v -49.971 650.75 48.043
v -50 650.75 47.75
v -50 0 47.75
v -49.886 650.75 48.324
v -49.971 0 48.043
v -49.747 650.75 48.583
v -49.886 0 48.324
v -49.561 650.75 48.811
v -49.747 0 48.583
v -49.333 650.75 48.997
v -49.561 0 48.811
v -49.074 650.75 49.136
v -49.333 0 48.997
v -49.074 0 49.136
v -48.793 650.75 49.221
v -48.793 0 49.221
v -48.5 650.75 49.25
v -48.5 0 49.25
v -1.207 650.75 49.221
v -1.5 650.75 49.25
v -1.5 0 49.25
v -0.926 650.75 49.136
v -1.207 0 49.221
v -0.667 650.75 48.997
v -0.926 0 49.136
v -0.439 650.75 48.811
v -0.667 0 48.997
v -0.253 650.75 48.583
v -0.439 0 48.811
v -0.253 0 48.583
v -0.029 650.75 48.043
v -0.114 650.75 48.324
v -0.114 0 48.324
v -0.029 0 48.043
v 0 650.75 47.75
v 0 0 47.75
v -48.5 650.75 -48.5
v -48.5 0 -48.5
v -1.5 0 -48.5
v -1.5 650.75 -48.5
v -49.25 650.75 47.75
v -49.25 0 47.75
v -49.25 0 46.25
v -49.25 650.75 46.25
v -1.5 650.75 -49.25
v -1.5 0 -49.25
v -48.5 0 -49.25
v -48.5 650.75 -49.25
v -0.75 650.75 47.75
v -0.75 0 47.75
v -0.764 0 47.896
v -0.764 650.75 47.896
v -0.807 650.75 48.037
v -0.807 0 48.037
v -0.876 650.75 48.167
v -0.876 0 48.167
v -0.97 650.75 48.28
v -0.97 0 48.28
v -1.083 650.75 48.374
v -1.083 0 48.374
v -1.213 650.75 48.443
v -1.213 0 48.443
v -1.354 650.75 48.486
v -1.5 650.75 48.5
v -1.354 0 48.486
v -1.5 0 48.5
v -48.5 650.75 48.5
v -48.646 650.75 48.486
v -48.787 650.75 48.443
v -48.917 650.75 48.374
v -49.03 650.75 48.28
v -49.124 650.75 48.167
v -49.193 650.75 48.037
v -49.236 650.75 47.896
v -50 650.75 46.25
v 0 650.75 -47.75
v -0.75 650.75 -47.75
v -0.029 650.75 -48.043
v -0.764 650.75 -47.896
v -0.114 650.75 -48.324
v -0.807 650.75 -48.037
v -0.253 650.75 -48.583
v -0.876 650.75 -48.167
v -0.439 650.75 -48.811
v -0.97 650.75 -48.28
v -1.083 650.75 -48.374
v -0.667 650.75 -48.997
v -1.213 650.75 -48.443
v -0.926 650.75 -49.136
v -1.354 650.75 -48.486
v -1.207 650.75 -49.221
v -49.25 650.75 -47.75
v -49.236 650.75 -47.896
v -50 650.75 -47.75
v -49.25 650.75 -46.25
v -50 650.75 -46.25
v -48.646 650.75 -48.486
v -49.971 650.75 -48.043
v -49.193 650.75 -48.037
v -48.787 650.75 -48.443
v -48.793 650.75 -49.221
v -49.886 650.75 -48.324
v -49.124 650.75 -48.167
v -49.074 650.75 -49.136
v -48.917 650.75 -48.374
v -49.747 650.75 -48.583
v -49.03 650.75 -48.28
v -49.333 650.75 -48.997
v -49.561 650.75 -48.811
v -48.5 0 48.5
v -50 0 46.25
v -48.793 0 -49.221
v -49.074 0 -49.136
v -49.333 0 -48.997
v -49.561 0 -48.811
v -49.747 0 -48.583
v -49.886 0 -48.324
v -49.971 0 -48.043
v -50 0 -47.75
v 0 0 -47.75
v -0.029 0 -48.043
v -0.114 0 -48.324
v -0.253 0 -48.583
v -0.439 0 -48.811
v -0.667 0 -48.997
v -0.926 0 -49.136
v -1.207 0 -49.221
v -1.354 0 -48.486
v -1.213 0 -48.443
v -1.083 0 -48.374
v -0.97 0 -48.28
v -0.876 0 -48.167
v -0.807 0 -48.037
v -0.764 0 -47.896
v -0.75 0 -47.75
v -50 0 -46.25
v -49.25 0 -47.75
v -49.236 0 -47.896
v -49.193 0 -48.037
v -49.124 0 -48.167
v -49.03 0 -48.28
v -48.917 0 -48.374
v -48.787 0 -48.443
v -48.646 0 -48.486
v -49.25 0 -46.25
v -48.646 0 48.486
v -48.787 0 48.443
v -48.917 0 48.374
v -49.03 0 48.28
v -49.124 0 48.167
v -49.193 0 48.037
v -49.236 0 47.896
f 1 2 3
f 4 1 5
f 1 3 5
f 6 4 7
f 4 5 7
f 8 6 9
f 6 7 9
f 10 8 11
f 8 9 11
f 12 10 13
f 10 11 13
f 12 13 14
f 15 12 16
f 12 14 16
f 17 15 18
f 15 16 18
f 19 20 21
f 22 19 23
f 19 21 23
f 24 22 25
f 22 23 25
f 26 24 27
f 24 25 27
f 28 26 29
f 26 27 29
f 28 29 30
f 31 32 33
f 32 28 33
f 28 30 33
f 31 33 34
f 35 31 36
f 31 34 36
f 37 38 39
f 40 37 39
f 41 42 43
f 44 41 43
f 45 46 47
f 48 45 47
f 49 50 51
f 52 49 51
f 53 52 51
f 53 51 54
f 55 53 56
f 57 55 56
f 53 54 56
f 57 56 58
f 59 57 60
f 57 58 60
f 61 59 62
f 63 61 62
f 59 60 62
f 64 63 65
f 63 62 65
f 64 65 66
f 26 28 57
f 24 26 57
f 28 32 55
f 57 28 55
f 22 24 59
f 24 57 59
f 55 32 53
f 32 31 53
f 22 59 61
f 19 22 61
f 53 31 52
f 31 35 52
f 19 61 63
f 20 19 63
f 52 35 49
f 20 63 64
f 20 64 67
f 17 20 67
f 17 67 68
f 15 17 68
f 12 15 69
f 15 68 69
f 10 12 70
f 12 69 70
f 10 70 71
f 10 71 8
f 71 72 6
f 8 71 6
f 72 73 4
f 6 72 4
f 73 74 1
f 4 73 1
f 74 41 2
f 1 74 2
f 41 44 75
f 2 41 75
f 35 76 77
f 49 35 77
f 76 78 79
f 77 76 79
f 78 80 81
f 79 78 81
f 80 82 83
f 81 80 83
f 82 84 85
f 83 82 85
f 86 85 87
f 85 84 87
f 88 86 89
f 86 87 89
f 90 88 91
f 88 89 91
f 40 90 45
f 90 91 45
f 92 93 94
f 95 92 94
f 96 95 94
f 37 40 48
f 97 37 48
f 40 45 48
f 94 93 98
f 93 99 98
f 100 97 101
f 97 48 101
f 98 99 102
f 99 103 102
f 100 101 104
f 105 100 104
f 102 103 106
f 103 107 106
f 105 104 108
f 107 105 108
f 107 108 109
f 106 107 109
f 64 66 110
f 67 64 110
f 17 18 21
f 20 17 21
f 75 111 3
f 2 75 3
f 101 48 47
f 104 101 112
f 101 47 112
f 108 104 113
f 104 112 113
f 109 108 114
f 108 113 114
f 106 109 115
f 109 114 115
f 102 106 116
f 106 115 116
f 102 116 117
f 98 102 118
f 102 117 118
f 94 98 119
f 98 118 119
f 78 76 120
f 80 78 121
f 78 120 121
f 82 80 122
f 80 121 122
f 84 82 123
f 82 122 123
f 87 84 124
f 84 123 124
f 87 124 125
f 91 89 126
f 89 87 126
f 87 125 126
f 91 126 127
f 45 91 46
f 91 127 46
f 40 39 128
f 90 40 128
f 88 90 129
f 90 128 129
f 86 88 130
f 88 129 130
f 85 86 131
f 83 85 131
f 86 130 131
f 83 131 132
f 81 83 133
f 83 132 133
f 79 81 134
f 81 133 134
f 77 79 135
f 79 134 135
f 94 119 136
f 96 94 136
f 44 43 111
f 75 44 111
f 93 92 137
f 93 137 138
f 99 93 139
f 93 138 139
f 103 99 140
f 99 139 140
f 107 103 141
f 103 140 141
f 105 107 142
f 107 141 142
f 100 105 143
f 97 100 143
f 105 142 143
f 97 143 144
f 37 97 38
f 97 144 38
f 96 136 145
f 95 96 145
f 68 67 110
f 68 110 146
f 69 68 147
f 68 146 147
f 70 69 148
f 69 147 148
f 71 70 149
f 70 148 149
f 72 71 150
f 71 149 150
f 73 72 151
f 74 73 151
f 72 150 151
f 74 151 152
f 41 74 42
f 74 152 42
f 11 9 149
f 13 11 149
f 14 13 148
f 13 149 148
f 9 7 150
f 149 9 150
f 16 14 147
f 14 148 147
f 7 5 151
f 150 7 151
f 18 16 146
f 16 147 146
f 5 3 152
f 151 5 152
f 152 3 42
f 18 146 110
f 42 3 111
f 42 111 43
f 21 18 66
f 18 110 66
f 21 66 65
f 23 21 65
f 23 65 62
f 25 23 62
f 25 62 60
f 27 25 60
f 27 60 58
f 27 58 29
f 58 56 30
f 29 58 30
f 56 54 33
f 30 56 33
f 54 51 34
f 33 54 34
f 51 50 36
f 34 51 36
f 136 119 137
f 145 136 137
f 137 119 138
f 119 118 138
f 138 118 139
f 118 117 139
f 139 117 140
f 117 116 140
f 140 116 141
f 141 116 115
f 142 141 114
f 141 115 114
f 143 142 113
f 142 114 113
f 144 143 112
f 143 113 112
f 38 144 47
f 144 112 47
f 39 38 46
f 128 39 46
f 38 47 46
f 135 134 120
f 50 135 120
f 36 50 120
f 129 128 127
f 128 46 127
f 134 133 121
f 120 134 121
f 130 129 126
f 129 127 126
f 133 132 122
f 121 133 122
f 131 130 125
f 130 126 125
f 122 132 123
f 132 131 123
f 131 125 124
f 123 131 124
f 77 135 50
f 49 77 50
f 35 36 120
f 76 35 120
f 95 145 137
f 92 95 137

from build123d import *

# Parameters (mm, degrees)
MOVE_BODY_2_DEPTH    = 3000
SKETCH_6_OUTSIDE_W   = 652.406
SKETCH_6_OUTSIDE_H   = 3602.406
SKETCH_6_OUTSIDE_W_2 = 50
SKETCH_6_OUTSIDE_H_2 = 650.75
CUT_EXTRUDE_1_DEPTH  = 3003.033019472


# Read off the part's stored shape, not the designer's step: Тело-Переместить/Копировать2
with BuildPart() as part:
    # Move Body 2 outline → Move Body 2 (new body)
    with BuildSketch(Plane(origin=(0, 0, 0), x_dir=(1, 0, 0), z_dir=(0, 1, 0))):
        with BuildLine():
            Line((-50, 47.75), (-50, 46.25))
            Line((-50, 46.25), (-49.25, 46.25))
            Line((-49.25, 46.25), (-49.25, 47.75))
            ThreePointArc((-49.25, 47.75), (-49.030330086, 48.280330086), (-48.5, 48.5))
            Line((-48.5, 48.5), (-1.5, 48.5))
            ThreePointArc((-1.5, 48.5), (-0.969669914, 48.280330086), (-0.75, 47.75))
            Line((-0.75, 47.75), (-0.75, -47.75))
            ThreePointArc((-0.75, -47.75), (-0.969669914, -48.280330086), (-1.5, -48.5))
            Line((-1.5, -48.5), (-48.5, -48.5))
            ThreePointArc((-48.5, -48.5), (-49.030330086, -48.280330086), (-49.25, -47.75))
            Line((-49.25, -47.75), (-49.25, -46.25))
            Line((-49.25, -46.25), (-50, -46.25))
            Line((-50, -46.25), (-50, -47.75))
            ThreePointArc((-50, -47.75), (-49.560660172, -48.810660172), (-48.5, -49.25))
            Line((-48.5, -49.25), (-1.5, -49.25))
            ThreePointArc((-1.5, -49.25), (-0.439339828, -48.810660172), (0, -47.75))
            Line((0, -47.75), (0, 47.75))
            ThreePointArc((0, 47.75), (-0.439339828, 48.810660172), (-1.5, 49.25))
            Line((-1.5, 49.25), (-48.5, 49.25))
            ThreePointArc((-48.5, 49.25), (-49.560660172, 48.810660172), (-50, 47.75))
        make_face()
    extrude(amount=MOVE_BODY_2_DEPTH)

    # Эскиз6 outside → Вырез-Вытянуть1 (cut, through all)
    with BuildSketch(Plane(origin=(0, 0, -49.25), x_dir=(-1, 0, 0), z_dir=(0, 0, -1))):
        with Locations((25, 1500)):
            Rectangle(SKETCH_6_OUTSIDE_W, SKETCH_6_OUTSIDE_H)
        with Locations((25, 325.375)):
            Rectangle(SKETCH_6_OUTSIDE_W_2, SKETCH_6_OUTSIDE_H_2, mode=Mode.SUBTRACT)
    extrude(amount=-CUT_EXTRUDE_1_DEPTH, mode=Mode.SUBTRACT)


solid = part.part
